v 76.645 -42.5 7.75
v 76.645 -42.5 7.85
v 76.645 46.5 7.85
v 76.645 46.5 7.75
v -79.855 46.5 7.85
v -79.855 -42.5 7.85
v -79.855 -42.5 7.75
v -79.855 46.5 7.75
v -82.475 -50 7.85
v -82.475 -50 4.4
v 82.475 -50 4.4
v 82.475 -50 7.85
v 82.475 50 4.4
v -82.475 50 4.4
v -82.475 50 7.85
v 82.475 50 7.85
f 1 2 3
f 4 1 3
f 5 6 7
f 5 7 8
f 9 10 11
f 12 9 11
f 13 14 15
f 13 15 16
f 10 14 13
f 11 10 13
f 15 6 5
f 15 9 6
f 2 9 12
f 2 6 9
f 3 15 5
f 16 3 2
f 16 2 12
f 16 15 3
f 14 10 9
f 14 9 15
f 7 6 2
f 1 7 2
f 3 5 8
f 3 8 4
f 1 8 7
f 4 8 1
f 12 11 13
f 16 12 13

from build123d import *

# Parameters (mm, degrees)
ESQUISSE1_R             = 1.524
BOSS_EXTRU_1_DEPTH      = 2.1
ESQUISSE2_W             = 25.4
ESQUISSE2_H             = 25.4
BOSS_EXTRU_2_DEPTH      = 2.3
ESQUISSE3_W             = 164.95
ESQUISSE3_H             = 100
BOSS_EXTRU_3_DEPTH      = 3.45
ESQUISSE4_W             = 156.5
ESQUISSE4_H             = 89
ENL_V_MAT_EXTRU_1_DEPTH = 0.1
ESQUISSE5_W             = 29.8
ESQUISSE5_H             = 7.4
ENL_V_MAT_EXTRU_2_DEPTH = 2.1
CONG_1_R                = 1
ESQUISSE6_W             = 26.5
ESQUISSE6_H             = 5.4
BOSS_EXTRU_4_DEPTH      = 2
ESQUISSE7_W             = 11.59
ESQUISSE7_H             = 15
BOSS_EXTRU_5_DEPTH      = 6.16
ESQUISSE8_W             = 5.5
ESQUISSE8_H             = 7.88
BOSS_EXTRU_6_DEPTH      = 2.8
ESQUISSE9_W             = 13.84
ESQUISSE9_H             = 13.84
BOSS_EXTRU_7_DEPTH      = 1
BOSS_EXTRU_8_DEPTH      = 0.1
BOSS_EXTRU_8_DEPTH_BACK = 2.11
ESQUISSE10_R            = 3.175
ESQUISSE10_R_2          = 1.524


with BuildPart() as part:
    # Esquisse1 → Boss.-Extru.1 (new body)
    with BuildSketch(Plane.XY):
        with BuildLine():
            Line((-82.615, 53.25), (-82.615, -53.25))
            ThreePointArc((-82.615, -53.25), (-78.613, -57.252), (-74.611, -53.25))
            Line((-74.611, -53.25), (-74.611, -50.036793886))
            Line((-74.611, -50.036793886), (74.611, -50.036793886))
            Line((74.611, -50.036793886), (74.611, -53.25))
            ThreePointArc((74.611, -53.25), (78.613, -57.252), (82.615, -53.25))
            Line((82.615, -53.25), (82.615, 53.25))
            ThreePointArc((82.615, 53.25), (78.613, 57.252), (74.611, 53.25))
            Line((74.611, 53.25), (74.611, 50.036793886))
            Line((74.611, 50.036793886), (-74.611, 50.036793886))
            Line((-74.611, 50.036793886), (-74.611, 53.25))
            ThreePointArc((-74.611, 53.25), (-78.613, 57.252), (-82.615, 53.25))
        make_face()
        with Locations((-78.613, 53.25)):
            Circle(ESQUISSE1_R, mode=Mode.SUBTRACT)
        with Locations((-78.613, -53.25)):
            Circle(ESQUISSE1_R, mode=Mode.SUBTRACT)
        with Locations((78.613, -53.25)):
            Circle(ESQUISSE1_R, mode=Mode.SUBTRACT)
        with Locations((78.613, 53.25)):
            Circle(ESQUISSE1_R, mode=Mode.SUBTRACT)
    extrude(amount=BOSS_EXTRU_1_DEPTH)

    # Esquisse2 → Boss.-Extru.2 (add)
    with BuildSketch(Plane.XY.offset(2.1)):
        with Locations((-61.8, 27.3)):
            Rectangle(ESQUISSE2_W, ESQUISSE2_H)
        with Locations((-61.8, -27.3)):
            Rectangle(ESQUISSE2_W, ESQUISSE2_H)
        with Locations((61.8, 27.3)):
            Rectangle(ESQUISSE2_W, ESQUISSE2_H)
        with Locations((61.8, -27.3)):
            Rectangle(ESQUISSE2_W, ESQUISSE2_H)
    extrude(amount=BOSS_EXTRU_2_DEPTH)

    # Esquisse3 → Boss.-Extru.3 (add)
    with BuildSketch(Plane.XY.offset(4.4)):
        Rectangle(ESQUISSE3_W, ESQUISSE3_H)
    extrude(amount=BOSS_EXTRU_3_DEPTH)

    # Esquisse4 → Enlèv. mat.-Extru.1 (cut)
    with BuildSketch(Plane.XY.offset(7.85)):
        with Locations((-1.605, 2)):
            Rectangle(ESQUISSE4_W, ESQUISSE4_H)
    extrude(amount=-ENL_V_MAT_EXTRU_1_DEPTH, mode=Mode.SUBTRACT)

    # Esquisse5 → Enlèv. mat.-Extru.2 (cut)
    with BuildSketch(Plane(origin=(0, 0, 0), x_dir=(-1, 0, 0), z_dir=(0, 0, -1))):
        with Locations((38.315, -0.136793886)):
            Rectangle(ESQUISSE5_W, ESQUISSE5_H)
    extrude(amount=-ENL_V_MAT_EXTRU_2_DEPTH, mode=Mode.SUBTRACT)

    # Congé1
    cong_1_edges = [part.edges().sort_by_distance(p)[0] for p in [
        (-23.415, 3.563206114, 1.05),
        (-23.415, -3.836793886, 1.05),
        (-53.215, -3.836793886, 1.05),
        (-53.215, 3.563206114, 1.05),
    ]]
    fillet(cong_1_edges, radius=CONG_1_R)

    # Esquisse6 → Boss.-Extru.4 (add)
    with BuildSketch(Plane(origin=(0, 0, 0), x_dir=(-1, 0, 0), z_dir=(0, 0, -1))):
        with Locations((38.315, 6.363206114)):
            Rectangle(ESQUISSE6_W, ESQUISSE6_H)
    extrude(amount=BOSS_EXTRU_4_DEPTH)

    # Esquisse7 → Boss.-Extru.5 (add)
    with BuildSketch(Plane(origin=(0, 0, 0), x_dir=(-1, 0, 0), z_dir=(0, 0, -1))):
        with Locations((-79.02, 1.017206114)):
            Rectangle(ESQUISSE7_W, ESQUISSE7_H)
    extrude(amount=BOSS_EXTRU_5_DEPTH)

    # Esquisse8 → Boss.-Extru.6 (add)
    with BuildSketch(Plane(origin=(0, 0, 0), x_dir=(-1, 0, 0), z_dir=(0, 0, -1))):
        with Locations((-80.665, -20.318793886)):
            Rectangle(ESQUISSE8_W, ESQUISSE8_H)
    extrude(amount=BOSS_EXTRU_6_DEPTH)

    # Esquisse9 → Boss.-Extru.7 (add)
    with BuildSketch(Plane(origin=(0, 0, 0), x_dir=(-1, 0, 0), z_dir=(0, 0, -1))):
        with Locations((-52.695, 0.616793886)):
            Rectangle(ESQUISSE9_W, ESQUISSE9_H)
    extrude(amount=BOSS_EXTRU_7_DEPTH)

    # Esquisse10 → Boss.-Extru.8 (add, two sides: drawn at the far end of the back side and taken through both)
    # profile 1 of 4: a face of its own
    with BuildSketch(Plane.XY.offset(2.1).offset(-BOSS_EXTRU_8_DEPTH_BACK)):
        with Locations((-78.613, 53.25)):
            Circle(ESQUISSE10_R)
        with Locations((-78.613, 53.25)):
            Circle(ESQUISSE10_R_2, mode=Mode.SUBTRACT)
    # profile 2 of 4: a face of its own
    with BuildSketch(Plane.XY.offset(2.1).offset(-BOSS_EXTRU_8_DEPTH_BACK)):
        with Locations((-78.613, -53.25)):
            Circle(ESQUISSE10_R)
        with Locations((-78.613, -53.25)):
            Circle(ESQUISSE10_R_2, mode=Mode.SUBTRACT)
    # profile 3 of 4: a face of its own
    with BuildSketch(Plane.XY.offset(2.1).offset(-BOSS_EXTRU_8_DEPTH_BACK)):
        with Locations((78.613, -53.25)):
            Circle(ESQUISSE10_R)
        with Locations((78.613, -53.25)):
            Circle(ESQUISSE10_R_2, mode=Mode.SUBTRACT)
    # profile 4 of 4: a face of its own
    with BuildSketch(Plane.XY.offset(2.1).offset(-BOSS_EXTRU_8_DEPTH_BACK)):
        with Locations((78.613, 53.25)):
            Circle(ESQUISSE10_R)
        with Locations((78.613, 53.25)):
            Circle(ESQUISSE10_R_2, mode=Mode.SUBTRACT)
    extrude(amount=BOSS_EXTRU_8_DEPTH + BOSS_EXTRU_8_DEPTH_BACK)

    # Split1
    split(bisect_by=Plane.XY.offset(4.4), keep=Keep.TOP)


solid = part.part
